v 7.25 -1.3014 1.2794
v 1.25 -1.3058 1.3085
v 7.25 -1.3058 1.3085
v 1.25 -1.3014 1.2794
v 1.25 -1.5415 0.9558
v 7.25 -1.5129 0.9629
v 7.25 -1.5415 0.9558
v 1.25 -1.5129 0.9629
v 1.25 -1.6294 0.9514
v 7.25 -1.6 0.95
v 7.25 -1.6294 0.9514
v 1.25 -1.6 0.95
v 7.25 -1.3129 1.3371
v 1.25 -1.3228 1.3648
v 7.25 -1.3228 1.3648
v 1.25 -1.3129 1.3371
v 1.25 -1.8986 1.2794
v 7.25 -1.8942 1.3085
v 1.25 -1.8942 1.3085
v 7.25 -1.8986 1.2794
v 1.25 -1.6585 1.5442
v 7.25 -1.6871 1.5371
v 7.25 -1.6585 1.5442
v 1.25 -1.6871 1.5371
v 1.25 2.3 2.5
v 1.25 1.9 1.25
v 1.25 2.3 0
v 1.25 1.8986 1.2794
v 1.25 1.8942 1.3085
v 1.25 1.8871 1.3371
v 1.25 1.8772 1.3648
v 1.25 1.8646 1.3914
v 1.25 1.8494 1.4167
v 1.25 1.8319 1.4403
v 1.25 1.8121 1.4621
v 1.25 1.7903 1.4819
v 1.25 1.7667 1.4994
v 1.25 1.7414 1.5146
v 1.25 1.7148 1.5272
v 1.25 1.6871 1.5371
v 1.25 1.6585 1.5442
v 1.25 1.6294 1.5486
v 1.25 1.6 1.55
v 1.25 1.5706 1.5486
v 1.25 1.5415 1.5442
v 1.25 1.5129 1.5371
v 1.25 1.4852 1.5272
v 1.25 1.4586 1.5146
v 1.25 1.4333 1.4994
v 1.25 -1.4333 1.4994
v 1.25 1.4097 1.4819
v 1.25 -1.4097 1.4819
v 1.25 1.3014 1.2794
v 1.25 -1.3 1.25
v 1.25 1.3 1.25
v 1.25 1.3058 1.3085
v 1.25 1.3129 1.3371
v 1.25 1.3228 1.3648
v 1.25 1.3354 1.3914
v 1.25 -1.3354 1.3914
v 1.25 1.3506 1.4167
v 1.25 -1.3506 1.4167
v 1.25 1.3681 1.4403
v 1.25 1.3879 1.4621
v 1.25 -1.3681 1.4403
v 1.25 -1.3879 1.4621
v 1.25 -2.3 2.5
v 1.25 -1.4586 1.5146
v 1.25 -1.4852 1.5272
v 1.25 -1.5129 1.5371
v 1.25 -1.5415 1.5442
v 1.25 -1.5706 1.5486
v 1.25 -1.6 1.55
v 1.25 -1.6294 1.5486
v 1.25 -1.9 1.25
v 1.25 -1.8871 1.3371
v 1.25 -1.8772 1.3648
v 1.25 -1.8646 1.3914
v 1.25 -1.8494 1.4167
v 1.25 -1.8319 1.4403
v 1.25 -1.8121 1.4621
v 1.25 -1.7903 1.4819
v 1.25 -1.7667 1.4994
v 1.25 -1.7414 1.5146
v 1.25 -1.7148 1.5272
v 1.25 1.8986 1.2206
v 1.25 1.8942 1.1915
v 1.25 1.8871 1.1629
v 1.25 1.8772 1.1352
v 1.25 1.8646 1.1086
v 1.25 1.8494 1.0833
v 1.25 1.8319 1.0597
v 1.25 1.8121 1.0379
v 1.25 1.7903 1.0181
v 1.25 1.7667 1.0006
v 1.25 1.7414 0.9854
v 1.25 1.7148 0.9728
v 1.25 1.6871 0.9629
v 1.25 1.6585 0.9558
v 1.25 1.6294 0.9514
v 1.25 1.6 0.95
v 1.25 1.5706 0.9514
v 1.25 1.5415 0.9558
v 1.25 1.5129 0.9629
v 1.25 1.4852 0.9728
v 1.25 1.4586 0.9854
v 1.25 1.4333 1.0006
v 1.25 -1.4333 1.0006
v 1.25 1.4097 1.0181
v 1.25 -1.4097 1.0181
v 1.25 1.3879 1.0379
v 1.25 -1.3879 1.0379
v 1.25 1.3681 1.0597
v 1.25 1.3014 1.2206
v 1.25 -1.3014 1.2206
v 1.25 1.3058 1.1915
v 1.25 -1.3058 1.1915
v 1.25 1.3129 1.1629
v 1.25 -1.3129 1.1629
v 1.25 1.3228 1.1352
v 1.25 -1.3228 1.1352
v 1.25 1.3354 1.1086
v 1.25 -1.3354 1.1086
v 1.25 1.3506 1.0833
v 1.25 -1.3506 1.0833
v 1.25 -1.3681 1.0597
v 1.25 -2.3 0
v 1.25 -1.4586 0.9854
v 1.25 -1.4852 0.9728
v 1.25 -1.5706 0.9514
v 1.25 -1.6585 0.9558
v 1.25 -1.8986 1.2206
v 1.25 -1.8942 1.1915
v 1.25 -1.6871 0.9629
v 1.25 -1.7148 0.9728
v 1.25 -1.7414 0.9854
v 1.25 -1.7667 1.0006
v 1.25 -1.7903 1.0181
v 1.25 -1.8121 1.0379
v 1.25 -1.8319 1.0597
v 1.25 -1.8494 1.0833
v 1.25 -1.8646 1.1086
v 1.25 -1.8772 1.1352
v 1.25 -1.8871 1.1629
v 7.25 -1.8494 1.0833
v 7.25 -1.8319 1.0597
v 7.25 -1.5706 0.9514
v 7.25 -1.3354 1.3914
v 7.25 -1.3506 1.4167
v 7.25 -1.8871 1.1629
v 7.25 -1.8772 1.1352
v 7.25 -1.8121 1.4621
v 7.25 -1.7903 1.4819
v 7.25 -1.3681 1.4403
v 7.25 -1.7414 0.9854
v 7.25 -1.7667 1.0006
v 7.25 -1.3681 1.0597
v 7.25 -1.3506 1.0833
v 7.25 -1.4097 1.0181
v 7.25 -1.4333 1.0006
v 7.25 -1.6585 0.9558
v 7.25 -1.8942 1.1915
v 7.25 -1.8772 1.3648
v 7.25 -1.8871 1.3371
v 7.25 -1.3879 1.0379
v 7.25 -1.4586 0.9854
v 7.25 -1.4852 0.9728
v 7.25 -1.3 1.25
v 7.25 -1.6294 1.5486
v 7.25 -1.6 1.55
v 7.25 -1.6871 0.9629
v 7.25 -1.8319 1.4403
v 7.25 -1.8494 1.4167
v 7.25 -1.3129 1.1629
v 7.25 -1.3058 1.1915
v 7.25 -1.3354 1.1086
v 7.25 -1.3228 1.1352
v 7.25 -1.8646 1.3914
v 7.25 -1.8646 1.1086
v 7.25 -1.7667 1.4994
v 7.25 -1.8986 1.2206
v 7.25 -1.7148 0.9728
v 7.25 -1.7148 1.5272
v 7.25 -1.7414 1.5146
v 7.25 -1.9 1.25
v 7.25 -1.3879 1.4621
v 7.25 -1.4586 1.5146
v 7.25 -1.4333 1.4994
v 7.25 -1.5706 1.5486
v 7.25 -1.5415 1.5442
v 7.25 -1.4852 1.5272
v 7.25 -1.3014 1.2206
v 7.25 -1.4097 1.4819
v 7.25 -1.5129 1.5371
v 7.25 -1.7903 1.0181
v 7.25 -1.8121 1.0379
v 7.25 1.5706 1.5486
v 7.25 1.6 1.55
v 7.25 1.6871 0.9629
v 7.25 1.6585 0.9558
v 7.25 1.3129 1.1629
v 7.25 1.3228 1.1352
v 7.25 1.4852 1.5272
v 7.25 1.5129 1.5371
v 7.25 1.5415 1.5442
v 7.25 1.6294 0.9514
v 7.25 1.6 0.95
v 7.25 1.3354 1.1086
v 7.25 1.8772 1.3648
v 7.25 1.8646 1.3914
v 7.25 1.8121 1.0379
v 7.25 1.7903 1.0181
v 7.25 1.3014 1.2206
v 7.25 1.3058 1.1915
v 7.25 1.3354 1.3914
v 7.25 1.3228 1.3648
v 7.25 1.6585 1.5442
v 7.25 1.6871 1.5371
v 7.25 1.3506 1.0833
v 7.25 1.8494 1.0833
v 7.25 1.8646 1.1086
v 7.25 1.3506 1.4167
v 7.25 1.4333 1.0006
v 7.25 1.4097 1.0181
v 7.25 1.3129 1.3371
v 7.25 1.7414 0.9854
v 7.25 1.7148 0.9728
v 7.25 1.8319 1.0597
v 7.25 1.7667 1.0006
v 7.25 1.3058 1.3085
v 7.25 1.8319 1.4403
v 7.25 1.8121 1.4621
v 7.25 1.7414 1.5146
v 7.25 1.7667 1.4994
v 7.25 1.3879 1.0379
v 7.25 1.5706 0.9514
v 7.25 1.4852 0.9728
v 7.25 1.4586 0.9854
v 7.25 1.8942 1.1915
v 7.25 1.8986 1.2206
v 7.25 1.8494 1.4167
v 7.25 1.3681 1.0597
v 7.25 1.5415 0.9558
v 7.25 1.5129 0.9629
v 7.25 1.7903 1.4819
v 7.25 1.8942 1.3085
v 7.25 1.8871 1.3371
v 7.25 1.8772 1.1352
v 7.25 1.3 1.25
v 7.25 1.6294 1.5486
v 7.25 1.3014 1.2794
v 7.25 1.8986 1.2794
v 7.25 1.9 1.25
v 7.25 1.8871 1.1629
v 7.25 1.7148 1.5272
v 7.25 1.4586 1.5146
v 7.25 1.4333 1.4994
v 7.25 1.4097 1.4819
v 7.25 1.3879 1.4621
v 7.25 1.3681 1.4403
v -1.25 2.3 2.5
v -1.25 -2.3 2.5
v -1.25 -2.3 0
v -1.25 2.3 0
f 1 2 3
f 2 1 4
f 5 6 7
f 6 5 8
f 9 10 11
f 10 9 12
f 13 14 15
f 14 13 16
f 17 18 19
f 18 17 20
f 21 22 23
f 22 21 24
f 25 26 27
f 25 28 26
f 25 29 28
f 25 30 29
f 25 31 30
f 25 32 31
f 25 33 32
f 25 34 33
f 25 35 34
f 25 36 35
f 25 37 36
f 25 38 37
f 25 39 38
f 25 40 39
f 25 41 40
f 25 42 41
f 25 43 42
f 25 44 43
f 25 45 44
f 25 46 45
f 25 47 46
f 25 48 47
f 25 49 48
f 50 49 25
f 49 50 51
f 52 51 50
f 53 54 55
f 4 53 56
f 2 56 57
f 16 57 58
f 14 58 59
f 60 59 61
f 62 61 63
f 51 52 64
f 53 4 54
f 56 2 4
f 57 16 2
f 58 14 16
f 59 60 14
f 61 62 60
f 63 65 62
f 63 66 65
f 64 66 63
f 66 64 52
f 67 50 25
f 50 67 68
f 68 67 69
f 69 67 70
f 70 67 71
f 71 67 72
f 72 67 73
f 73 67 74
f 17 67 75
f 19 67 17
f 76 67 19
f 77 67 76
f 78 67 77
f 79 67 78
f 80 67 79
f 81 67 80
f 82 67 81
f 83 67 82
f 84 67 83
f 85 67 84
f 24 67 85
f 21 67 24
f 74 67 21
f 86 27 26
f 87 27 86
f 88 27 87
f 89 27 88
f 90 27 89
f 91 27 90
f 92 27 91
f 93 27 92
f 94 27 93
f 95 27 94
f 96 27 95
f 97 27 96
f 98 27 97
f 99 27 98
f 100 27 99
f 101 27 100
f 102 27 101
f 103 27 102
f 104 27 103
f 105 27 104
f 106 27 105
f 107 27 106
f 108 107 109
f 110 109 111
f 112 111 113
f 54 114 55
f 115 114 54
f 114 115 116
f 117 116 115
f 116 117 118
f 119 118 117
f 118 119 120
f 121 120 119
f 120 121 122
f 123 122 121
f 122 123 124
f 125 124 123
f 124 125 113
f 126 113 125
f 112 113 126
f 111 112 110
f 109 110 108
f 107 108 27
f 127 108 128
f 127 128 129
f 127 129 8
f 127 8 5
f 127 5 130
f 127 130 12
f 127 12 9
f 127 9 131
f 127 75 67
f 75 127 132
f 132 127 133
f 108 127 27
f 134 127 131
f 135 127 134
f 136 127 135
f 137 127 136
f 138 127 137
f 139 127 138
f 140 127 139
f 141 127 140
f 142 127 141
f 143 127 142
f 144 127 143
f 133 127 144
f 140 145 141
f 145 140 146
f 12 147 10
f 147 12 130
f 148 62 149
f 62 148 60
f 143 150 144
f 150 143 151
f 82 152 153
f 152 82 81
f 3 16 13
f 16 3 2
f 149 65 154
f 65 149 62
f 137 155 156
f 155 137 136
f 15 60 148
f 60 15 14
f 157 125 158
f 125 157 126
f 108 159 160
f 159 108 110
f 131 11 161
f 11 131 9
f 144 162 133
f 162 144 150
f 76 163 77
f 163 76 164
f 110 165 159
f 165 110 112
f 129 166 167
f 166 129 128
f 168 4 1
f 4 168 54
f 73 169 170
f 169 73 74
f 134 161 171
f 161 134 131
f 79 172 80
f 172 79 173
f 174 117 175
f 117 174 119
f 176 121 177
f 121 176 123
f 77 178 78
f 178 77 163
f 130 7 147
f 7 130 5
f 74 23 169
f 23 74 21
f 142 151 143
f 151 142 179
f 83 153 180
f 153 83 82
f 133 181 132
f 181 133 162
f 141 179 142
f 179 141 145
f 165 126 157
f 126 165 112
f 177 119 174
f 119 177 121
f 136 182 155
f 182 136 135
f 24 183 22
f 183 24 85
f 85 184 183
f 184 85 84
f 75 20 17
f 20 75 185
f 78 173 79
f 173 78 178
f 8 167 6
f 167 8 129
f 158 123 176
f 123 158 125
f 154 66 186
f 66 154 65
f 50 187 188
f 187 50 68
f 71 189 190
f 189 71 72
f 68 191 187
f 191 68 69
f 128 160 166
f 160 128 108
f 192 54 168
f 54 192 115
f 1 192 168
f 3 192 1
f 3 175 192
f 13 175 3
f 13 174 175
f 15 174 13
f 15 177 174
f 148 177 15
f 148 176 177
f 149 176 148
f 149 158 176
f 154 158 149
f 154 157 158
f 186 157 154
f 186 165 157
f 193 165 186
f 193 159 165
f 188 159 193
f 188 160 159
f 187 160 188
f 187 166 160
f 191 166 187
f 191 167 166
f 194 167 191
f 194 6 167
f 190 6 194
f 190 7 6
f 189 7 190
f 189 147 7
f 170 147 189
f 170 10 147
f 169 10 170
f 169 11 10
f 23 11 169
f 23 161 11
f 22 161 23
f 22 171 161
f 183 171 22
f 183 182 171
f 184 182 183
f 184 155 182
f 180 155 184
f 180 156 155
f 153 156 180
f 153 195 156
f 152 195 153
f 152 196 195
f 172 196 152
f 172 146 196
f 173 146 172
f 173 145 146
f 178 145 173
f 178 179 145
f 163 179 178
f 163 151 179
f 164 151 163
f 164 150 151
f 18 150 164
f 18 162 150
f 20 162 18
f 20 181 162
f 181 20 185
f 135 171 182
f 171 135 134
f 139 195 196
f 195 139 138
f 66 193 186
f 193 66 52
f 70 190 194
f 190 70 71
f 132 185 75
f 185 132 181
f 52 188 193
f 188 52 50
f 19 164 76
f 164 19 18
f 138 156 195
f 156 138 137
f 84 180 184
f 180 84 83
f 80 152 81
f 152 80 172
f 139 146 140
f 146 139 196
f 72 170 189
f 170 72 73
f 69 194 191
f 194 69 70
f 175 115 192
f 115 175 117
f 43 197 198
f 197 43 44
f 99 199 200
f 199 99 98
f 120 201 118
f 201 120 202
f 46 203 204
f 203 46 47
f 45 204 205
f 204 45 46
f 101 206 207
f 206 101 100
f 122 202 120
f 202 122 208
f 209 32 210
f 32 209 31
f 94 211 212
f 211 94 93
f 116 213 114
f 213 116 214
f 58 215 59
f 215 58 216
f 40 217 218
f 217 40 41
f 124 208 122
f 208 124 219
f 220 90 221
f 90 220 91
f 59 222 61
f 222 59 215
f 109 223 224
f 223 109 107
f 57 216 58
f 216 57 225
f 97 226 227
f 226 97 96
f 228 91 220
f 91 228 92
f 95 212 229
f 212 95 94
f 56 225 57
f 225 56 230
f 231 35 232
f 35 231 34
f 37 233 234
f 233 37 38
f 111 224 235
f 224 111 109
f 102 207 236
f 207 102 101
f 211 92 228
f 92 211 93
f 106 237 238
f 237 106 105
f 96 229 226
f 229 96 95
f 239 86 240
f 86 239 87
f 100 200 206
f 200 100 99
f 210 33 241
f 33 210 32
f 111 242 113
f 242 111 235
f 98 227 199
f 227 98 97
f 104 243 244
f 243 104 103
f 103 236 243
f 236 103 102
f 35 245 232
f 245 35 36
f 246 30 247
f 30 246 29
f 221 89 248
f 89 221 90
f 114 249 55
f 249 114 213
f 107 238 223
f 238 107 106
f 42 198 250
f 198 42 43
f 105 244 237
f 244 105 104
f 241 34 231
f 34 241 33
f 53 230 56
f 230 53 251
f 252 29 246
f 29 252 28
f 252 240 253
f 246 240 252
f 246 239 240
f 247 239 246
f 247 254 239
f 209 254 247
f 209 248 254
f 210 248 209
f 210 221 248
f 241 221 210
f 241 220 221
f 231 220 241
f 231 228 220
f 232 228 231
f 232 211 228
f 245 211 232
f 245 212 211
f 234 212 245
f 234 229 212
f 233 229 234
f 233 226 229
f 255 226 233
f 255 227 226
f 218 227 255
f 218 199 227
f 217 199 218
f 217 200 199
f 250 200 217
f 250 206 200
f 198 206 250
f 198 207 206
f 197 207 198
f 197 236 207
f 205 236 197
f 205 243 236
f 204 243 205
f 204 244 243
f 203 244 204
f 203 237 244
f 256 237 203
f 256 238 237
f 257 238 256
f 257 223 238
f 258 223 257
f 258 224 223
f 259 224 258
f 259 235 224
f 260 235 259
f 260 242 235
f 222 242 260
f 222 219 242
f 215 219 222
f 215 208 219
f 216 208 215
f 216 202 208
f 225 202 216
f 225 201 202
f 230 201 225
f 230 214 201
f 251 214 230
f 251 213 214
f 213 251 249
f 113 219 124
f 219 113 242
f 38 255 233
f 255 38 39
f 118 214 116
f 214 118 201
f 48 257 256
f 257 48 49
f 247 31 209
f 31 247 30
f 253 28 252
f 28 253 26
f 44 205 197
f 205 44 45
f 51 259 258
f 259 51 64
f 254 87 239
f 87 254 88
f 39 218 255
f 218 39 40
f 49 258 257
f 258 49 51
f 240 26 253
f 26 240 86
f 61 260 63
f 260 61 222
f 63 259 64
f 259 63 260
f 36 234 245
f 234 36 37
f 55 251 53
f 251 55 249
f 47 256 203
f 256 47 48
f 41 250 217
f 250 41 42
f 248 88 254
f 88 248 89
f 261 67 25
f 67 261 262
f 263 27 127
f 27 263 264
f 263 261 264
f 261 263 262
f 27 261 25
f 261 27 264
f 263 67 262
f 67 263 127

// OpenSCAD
$fn = 64;

module tht_package(body_w=4.6, body_t=2.5, body_l=2.5) {
    color([0.1,0.1,0.1])
    translate([-body_l/2, -body_w/2, 0])
        cube([body_l, body_w, body_t], center=false);
}

module leads(body_w=4.6, body_t=2.5, body_l=2.5,
             lead_d=0.6, lead_len=6.0, lead_inset=0.7) {
    lead_x = body_l/2 + lead_len/2;
    yoff = body_w/2 - lead_inset;
    for (s = [-1, 1]) {
        color([0.75,0.75,0.75])
        translate([lead_x, s*yoff, body_t/2])
            rotate([0,90,0])
                cylinder(d=lead_d, h=lead_len, center=true);
    }
}

module model() {
    union() {
        tht_package();
        leads();
    }
}

model();
